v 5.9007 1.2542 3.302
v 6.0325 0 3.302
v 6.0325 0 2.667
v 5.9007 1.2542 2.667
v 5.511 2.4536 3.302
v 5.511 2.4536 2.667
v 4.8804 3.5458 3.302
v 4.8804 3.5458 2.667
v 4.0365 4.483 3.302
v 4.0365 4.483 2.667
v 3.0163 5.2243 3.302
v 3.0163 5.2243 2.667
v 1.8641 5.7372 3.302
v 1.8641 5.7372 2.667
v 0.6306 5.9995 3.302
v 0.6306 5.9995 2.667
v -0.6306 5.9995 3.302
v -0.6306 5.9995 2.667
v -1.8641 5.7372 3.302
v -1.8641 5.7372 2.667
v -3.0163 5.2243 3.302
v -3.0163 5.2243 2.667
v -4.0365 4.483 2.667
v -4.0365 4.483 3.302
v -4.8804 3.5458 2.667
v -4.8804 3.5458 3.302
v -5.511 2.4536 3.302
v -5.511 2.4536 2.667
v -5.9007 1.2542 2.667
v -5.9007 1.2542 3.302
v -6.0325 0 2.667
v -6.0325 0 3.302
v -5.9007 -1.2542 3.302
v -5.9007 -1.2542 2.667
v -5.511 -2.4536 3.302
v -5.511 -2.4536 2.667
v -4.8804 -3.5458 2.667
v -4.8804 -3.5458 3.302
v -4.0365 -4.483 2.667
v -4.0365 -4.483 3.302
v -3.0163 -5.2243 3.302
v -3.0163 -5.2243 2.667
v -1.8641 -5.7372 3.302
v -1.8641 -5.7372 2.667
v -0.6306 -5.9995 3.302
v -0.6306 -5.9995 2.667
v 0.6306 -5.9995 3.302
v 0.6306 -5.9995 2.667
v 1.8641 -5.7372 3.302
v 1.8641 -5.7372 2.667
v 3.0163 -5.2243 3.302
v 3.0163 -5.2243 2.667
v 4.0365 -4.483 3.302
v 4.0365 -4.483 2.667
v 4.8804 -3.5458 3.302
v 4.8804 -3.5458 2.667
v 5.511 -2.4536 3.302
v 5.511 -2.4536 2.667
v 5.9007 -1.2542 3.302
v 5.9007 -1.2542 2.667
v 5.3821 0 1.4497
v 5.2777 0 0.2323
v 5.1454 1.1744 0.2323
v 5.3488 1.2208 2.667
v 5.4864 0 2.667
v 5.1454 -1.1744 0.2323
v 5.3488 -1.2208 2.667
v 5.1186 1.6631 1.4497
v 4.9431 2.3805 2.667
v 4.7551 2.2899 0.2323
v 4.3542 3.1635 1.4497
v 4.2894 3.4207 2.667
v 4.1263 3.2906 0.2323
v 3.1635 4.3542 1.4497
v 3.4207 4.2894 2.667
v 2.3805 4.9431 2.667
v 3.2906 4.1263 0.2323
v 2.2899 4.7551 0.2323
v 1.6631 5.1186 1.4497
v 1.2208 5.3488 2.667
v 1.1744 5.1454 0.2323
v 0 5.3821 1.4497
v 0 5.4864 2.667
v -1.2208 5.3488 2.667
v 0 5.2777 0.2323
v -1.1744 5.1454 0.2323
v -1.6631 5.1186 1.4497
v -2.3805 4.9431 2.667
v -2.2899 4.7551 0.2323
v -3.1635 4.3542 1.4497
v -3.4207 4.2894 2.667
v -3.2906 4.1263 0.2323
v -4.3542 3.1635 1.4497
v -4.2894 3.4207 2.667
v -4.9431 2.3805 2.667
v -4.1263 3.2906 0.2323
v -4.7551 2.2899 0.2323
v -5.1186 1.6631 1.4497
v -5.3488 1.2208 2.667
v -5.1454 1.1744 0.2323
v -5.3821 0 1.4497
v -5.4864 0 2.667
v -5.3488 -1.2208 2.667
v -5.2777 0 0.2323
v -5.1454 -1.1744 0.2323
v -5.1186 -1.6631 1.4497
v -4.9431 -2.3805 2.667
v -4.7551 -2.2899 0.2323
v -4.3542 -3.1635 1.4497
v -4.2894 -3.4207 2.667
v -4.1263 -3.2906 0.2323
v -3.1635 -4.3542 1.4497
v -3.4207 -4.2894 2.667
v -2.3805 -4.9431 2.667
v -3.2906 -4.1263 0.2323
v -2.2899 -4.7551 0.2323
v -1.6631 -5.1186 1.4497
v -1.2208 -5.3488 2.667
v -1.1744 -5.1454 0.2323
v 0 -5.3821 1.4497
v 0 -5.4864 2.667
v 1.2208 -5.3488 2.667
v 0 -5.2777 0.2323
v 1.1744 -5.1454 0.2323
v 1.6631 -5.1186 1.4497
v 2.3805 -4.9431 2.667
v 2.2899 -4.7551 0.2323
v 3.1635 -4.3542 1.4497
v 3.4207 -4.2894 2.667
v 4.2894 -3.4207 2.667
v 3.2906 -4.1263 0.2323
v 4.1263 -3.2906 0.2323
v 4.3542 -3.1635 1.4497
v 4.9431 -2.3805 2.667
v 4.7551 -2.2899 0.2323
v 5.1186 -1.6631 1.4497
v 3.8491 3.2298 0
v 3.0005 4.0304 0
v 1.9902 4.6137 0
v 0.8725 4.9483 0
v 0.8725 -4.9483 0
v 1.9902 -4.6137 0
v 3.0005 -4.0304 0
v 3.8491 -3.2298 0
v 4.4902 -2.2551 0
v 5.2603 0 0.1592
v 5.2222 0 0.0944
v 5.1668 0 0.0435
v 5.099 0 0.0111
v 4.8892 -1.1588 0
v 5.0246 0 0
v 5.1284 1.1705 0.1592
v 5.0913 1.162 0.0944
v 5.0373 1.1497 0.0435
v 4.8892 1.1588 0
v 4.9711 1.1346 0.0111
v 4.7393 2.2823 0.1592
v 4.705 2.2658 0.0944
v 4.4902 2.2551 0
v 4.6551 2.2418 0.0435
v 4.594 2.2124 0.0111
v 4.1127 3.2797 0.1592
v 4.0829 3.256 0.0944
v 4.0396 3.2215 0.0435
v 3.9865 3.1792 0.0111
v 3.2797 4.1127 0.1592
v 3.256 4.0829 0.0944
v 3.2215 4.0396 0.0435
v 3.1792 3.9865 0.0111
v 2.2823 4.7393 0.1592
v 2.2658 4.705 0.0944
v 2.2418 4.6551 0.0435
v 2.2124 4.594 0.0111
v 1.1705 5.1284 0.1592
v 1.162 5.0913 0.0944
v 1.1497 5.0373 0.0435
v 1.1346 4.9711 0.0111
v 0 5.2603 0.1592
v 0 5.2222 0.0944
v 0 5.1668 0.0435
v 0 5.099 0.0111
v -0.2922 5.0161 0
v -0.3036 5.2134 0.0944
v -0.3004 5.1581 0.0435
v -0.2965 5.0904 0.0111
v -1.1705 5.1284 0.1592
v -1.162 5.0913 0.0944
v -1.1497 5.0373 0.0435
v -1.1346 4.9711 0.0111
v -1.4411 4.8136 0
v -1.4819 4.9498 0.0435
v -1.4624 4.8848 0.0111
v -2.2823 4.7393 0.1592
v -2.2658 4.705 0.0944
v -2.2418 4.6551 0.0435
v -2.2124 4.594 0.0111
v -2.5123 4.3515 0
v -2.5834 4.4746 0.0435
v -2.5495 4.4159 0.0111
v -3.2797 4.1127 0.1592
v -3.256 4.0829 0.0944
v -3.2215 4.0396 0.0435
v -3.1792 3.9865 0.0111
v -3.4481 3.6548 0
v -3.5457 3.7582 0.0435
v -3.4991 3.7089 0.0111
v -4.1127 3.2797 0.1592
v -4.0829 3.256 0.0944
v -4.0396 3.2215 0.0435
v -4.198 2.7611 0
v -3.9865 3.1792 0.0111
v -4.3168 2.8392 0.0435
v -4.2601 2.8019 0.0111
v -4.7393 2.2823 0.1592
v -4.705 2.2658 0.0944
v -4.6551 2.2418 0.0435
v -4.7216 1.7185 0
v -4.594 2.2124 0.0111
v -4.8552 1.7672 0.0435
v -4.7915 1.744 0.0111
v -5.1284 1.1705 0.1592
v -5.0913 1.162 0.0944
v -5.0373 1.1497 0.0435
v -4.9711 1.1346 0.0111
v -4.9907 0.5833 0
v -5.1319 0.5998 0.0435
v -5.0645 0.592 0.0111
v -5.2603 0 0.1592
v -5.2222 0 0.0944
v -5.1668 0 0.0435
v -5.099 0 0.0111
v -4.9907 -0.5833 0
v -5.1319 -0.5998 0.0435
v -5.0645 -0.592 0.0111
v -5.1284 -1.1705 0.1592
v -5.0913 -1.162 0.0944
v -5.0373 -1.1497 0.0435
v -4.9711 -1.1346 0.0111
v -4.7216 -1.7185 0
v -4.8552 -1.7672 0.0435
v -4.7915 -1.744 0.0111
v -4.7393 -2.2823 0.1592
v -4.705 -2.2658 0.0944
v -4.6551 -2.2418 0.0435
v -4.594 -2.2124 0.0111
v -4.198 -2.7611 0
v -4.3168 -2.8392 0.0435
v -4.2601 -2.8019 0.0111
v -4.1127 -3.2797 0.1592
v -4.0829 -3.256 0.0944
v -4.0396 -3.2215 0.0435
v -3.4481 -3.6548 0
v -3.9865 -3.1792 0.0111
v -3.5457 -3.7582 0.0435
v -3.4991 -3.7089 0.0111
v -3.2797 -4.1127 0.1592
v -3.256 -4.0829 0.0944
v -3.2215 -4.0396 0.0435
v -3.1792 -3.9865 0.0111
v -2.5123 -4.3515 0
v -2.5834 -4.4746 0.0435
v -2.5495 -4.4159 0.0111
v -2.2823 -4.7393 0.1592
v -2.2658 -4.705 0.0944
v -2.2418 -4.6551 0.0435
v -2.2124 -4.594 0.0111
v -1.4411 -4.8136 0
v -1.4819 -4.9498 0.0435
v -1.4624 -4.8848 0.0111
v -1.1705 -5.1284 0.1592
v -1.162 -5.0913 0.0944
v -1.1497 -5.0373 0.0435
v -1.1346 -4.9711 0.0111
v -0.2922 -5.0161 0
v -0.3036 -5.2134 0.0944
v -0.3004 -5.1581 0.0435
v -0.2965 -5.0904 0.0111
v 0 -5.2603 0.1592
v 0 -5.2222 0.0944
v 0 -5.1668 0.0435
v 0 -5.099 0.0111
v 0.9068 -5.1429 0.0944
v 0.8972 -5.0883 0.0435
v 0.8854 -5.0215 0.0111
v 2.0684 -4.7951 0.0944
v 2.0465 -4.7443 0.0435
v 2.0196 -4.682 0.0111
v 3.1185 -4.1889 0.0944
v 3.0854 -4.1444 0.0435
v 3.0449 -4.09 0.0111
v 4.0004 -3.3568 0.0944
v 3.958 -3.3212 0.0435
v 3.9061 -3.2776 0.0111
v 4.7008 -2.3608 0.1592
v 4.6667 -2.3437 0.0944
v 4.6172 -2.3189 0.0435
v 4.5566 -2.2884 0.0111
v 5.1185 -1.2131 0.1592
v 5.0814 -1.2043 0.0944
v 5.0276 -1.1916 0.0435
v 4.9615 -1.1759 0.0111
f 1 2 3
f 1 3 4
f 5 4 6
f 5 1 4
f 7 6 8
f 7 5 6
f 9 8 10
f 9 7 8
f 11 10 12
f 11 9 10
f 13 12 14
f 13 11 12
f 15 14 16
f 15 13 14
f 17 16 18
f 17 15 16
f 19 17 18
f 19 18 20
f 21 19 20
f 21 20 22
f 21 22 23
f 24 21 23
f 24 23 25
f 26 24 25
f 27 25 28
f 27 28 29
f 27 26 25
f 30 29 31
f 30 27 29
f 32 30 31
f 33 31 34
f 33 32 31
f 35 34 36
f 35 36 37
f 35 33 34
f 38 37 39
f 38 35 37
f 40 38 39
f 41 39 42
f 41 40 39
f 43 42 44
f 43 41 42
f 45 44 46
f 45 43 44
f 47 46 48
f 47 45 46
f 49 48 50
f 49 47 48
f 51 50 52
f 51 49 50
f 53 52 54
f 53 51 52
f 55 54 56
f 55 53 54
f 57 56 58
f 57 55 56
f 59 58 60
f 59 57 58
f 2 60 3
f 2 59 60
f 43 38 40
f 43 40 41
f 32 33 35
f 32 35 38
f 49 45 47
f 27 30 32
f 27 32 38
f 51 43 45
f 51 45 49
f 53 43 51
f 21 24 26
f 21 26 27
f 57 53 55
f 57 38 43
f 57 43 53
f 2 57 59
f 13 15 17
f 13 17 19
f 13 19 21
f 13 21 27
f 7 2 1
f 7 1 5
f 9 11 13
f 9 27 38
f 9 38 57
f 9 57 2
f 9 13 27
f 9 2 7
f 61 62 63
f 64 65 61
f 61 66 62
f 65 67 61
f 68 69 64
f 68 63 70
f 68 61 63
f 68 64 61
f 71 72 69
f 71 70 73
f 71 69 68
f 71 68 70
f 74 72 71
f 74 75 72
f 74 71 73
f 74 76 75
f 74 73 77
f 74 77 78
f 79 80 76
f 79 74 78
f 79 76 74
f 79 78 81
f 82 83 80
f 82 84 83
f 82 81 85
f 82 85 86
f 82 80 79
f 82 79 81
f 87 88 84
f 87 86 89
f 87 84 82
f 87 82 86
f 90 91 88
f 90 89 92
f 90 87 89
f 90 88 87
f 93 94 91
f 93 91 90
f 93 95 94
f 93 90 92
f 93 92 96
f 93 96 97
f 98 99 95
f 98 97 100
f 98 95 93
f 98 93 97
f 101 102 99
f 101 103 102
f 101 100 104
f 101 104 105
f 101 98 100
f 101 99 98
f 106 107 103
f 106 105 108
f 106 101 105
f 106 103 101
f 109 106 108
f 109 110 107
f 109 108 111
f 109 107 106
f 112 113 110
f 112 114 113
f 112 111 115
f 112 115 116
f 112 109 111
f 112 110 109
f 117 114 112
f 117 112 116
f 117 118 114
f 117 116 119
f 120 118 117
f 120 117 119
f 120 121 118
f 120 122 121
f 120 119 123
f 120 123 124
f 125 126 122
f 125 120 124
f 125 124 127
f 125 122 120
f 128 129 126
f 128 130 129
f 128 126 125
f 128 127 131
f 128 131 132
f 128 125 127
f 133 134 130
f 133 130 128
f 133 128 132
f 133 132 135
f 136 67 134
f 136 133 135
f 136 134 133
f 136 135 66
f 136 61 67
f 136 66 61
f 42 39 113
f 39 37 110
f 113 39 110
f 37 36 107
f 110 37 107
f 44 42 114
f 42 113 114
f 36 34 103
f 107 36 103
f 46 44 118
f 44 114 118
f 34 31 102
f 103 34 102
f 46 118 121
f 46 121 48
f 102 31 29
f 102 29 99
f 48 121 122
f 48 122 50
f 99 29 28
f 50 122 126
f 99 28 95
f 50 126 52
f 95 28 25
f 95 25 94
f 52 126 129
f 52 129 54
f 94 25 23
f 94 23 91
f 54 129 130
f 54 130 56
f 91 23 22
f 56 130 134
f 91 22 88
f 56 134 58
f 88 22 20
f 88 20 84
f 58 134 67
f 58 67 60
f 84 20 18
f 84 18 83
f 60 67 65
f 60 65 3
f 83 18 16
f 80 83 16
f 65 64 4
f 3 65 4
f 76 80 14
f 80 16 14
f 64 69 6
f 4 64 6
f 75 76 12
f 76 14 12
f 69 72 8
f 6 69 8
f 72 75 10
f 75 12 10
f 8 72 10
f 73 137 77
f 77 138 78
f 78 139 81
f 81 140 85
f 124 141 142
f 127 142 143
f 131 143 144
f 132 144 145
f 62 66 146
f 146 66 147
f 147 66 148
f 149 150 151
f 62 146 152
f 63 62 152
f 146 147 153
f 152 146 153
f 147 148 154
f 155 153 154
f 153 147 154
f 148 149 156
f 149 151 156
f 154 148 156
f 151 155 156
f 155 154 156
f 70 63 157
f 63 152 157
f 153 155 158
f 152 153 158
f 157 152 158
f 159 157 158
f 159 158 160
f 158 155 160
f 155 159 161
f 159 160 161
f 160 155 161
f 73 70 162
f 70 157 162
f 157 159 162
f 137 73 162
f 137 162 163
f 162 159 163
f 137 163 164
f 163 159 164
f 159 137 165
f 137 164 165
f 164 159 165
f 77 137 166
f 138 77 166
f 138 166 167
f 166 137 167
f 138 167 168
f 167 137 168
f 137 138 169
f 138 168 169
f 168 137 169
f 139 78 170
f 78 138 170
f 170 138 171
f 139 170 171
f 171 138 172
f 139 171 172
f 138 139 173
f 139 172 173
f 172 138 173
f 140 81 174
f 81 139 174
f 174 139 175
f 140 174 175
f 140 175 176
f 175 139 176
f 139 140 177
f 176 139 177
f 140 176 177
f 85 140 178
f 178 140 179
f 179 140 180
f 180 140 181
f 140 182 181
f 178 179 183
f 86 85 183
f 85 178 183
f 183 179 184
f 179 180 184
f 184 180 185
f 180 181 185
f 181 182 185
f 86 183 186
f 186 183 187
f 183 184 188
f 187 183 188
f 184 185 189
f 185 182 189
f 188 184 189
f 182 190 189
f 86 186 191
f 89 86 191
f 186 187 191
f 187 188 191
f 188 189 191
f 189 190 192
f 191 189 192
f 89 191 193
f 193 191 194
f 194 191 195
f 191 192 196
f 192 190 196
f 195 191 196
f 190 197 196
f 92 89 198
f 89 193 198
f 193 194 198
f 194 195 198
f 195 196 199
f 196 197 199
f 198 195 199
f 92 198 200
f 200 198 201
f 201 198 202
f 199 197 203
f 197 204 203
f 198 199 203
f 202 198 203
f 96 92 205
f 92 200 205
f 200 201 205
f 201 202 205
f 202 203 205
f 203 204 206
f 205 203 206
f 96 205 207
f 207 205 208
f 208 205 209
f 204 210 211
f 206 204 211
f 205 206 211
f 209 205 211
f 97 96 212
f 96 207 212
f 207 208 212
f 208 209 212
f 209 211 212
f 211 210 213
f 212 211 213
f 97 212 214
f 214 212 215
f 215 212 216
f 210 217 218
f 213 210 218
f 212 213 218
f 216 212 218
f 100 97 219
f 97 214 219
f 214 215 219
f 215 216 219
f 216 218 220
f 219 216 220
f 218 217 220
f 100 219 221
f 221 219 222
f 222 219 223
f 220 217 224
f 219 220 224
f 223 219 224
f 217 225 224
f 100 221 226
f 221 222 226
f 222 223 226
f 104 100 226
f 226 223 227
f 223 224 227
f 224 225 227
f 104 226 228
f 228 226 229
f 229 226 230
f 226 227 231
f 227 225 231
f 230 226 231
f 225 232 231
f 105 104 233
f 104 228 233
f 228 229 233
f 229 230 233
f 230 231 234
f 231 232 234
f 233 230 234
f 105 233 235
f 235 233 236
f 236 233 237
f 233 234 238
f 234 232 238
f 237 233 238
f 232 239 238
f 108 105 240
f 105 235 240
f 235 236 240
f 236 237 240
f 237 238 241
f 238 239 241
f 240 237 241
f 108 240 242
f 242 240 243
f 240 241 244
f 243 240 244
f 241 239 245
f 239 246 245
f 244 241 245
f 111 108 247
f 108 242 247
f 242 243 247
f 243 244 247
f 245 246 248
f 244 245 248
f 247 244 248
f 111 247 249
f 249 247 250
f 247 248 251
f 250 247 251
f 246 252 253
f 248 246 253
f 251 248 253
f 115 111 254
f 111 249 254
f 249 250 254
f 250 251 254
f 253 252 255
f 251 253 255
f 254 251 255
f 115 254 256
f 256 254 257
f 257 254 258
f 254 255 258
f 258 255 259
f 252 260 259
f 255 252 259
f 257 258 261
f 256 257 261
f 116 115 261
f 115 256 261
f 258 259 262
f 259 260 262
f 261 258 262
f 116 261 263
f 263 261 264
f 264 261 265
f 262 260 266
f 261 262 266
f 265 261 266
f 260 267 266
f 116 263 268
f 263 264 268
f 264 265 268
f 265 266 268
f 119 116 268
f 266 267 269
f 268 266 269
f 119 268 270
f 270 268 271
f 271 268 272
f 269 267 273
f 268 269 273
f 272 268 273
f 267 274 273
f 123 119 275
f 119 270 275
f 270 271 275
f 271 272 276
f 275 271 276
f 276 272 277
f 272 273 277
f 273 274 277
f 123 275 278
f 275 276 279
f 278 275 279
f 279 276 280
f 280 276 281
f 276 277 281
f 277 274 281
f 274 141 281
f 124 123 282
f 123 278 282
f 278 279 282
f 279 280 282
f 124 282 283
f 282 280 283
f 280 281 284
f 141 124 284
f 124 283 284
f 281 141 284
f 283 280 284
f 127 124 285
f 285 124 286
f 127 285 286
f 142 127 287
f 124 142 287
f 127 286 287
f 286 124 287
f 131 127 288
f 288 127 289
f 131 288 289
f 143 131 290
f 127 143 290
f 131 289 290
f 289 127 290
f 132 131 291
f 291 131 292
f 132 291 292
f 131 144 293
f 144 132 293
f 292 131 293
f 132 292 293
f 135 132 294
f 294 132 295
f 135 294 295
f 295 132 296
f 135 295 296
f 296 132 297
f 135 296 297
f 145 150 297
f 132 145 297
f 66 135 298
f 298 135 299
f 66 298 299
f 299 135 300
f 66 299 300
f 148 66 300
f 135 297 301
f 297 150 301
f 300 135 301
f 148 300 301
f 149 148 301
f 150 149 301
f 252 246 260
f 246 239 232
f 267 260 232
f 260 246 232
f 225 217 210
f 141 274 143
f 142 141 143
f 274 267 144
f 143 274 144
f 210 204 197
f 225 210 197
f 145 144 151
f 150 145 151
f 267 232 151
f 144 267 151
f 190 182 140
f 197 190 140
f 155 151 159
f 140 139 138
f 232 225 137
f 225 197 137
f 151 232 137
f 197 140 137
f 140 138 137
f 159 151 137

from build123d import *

# Parameters (mm, degrees)
SKETCH2_R           = 6.0325
BOSS_EXTRUDE1_DEPTH = 0.635
SKETCH1_R           = 5.2578
SKETCH3_R           = 5.4864
FILLET1_R           = 0.254


with BuildPart() as part:
    # Sketch2 → Boss-Extrude1 (new body)
    with BuildSketch(Plane.XY.offset(3.302)):
        Circle(SKETCH2_R)
    extrude(amount=-BOSS_EXTRUDE1_DEPTH)

    # Sketch1 → Loft1 section 0
    with BuildSketch(Plane.XY):
        Circle(SKETCH1_R)
    # Sketch3 → Loft1 section 1
    with BuildSketch(Plane(origin=(0, 0, 2.667), x_dir=(-1, 0, 0), z_dir=(0, 0, -1))):
        Circle(SKETCH3_R)
    loft()

    # Fillet1
    fillet1_edges = [part.edges().sort_by_distance(p)[0] for p in [
        (-5.2578, 0, 0),
    ]]
    fillet(fillet1_edges, radius=FILLET1_R)


solid = part.part
